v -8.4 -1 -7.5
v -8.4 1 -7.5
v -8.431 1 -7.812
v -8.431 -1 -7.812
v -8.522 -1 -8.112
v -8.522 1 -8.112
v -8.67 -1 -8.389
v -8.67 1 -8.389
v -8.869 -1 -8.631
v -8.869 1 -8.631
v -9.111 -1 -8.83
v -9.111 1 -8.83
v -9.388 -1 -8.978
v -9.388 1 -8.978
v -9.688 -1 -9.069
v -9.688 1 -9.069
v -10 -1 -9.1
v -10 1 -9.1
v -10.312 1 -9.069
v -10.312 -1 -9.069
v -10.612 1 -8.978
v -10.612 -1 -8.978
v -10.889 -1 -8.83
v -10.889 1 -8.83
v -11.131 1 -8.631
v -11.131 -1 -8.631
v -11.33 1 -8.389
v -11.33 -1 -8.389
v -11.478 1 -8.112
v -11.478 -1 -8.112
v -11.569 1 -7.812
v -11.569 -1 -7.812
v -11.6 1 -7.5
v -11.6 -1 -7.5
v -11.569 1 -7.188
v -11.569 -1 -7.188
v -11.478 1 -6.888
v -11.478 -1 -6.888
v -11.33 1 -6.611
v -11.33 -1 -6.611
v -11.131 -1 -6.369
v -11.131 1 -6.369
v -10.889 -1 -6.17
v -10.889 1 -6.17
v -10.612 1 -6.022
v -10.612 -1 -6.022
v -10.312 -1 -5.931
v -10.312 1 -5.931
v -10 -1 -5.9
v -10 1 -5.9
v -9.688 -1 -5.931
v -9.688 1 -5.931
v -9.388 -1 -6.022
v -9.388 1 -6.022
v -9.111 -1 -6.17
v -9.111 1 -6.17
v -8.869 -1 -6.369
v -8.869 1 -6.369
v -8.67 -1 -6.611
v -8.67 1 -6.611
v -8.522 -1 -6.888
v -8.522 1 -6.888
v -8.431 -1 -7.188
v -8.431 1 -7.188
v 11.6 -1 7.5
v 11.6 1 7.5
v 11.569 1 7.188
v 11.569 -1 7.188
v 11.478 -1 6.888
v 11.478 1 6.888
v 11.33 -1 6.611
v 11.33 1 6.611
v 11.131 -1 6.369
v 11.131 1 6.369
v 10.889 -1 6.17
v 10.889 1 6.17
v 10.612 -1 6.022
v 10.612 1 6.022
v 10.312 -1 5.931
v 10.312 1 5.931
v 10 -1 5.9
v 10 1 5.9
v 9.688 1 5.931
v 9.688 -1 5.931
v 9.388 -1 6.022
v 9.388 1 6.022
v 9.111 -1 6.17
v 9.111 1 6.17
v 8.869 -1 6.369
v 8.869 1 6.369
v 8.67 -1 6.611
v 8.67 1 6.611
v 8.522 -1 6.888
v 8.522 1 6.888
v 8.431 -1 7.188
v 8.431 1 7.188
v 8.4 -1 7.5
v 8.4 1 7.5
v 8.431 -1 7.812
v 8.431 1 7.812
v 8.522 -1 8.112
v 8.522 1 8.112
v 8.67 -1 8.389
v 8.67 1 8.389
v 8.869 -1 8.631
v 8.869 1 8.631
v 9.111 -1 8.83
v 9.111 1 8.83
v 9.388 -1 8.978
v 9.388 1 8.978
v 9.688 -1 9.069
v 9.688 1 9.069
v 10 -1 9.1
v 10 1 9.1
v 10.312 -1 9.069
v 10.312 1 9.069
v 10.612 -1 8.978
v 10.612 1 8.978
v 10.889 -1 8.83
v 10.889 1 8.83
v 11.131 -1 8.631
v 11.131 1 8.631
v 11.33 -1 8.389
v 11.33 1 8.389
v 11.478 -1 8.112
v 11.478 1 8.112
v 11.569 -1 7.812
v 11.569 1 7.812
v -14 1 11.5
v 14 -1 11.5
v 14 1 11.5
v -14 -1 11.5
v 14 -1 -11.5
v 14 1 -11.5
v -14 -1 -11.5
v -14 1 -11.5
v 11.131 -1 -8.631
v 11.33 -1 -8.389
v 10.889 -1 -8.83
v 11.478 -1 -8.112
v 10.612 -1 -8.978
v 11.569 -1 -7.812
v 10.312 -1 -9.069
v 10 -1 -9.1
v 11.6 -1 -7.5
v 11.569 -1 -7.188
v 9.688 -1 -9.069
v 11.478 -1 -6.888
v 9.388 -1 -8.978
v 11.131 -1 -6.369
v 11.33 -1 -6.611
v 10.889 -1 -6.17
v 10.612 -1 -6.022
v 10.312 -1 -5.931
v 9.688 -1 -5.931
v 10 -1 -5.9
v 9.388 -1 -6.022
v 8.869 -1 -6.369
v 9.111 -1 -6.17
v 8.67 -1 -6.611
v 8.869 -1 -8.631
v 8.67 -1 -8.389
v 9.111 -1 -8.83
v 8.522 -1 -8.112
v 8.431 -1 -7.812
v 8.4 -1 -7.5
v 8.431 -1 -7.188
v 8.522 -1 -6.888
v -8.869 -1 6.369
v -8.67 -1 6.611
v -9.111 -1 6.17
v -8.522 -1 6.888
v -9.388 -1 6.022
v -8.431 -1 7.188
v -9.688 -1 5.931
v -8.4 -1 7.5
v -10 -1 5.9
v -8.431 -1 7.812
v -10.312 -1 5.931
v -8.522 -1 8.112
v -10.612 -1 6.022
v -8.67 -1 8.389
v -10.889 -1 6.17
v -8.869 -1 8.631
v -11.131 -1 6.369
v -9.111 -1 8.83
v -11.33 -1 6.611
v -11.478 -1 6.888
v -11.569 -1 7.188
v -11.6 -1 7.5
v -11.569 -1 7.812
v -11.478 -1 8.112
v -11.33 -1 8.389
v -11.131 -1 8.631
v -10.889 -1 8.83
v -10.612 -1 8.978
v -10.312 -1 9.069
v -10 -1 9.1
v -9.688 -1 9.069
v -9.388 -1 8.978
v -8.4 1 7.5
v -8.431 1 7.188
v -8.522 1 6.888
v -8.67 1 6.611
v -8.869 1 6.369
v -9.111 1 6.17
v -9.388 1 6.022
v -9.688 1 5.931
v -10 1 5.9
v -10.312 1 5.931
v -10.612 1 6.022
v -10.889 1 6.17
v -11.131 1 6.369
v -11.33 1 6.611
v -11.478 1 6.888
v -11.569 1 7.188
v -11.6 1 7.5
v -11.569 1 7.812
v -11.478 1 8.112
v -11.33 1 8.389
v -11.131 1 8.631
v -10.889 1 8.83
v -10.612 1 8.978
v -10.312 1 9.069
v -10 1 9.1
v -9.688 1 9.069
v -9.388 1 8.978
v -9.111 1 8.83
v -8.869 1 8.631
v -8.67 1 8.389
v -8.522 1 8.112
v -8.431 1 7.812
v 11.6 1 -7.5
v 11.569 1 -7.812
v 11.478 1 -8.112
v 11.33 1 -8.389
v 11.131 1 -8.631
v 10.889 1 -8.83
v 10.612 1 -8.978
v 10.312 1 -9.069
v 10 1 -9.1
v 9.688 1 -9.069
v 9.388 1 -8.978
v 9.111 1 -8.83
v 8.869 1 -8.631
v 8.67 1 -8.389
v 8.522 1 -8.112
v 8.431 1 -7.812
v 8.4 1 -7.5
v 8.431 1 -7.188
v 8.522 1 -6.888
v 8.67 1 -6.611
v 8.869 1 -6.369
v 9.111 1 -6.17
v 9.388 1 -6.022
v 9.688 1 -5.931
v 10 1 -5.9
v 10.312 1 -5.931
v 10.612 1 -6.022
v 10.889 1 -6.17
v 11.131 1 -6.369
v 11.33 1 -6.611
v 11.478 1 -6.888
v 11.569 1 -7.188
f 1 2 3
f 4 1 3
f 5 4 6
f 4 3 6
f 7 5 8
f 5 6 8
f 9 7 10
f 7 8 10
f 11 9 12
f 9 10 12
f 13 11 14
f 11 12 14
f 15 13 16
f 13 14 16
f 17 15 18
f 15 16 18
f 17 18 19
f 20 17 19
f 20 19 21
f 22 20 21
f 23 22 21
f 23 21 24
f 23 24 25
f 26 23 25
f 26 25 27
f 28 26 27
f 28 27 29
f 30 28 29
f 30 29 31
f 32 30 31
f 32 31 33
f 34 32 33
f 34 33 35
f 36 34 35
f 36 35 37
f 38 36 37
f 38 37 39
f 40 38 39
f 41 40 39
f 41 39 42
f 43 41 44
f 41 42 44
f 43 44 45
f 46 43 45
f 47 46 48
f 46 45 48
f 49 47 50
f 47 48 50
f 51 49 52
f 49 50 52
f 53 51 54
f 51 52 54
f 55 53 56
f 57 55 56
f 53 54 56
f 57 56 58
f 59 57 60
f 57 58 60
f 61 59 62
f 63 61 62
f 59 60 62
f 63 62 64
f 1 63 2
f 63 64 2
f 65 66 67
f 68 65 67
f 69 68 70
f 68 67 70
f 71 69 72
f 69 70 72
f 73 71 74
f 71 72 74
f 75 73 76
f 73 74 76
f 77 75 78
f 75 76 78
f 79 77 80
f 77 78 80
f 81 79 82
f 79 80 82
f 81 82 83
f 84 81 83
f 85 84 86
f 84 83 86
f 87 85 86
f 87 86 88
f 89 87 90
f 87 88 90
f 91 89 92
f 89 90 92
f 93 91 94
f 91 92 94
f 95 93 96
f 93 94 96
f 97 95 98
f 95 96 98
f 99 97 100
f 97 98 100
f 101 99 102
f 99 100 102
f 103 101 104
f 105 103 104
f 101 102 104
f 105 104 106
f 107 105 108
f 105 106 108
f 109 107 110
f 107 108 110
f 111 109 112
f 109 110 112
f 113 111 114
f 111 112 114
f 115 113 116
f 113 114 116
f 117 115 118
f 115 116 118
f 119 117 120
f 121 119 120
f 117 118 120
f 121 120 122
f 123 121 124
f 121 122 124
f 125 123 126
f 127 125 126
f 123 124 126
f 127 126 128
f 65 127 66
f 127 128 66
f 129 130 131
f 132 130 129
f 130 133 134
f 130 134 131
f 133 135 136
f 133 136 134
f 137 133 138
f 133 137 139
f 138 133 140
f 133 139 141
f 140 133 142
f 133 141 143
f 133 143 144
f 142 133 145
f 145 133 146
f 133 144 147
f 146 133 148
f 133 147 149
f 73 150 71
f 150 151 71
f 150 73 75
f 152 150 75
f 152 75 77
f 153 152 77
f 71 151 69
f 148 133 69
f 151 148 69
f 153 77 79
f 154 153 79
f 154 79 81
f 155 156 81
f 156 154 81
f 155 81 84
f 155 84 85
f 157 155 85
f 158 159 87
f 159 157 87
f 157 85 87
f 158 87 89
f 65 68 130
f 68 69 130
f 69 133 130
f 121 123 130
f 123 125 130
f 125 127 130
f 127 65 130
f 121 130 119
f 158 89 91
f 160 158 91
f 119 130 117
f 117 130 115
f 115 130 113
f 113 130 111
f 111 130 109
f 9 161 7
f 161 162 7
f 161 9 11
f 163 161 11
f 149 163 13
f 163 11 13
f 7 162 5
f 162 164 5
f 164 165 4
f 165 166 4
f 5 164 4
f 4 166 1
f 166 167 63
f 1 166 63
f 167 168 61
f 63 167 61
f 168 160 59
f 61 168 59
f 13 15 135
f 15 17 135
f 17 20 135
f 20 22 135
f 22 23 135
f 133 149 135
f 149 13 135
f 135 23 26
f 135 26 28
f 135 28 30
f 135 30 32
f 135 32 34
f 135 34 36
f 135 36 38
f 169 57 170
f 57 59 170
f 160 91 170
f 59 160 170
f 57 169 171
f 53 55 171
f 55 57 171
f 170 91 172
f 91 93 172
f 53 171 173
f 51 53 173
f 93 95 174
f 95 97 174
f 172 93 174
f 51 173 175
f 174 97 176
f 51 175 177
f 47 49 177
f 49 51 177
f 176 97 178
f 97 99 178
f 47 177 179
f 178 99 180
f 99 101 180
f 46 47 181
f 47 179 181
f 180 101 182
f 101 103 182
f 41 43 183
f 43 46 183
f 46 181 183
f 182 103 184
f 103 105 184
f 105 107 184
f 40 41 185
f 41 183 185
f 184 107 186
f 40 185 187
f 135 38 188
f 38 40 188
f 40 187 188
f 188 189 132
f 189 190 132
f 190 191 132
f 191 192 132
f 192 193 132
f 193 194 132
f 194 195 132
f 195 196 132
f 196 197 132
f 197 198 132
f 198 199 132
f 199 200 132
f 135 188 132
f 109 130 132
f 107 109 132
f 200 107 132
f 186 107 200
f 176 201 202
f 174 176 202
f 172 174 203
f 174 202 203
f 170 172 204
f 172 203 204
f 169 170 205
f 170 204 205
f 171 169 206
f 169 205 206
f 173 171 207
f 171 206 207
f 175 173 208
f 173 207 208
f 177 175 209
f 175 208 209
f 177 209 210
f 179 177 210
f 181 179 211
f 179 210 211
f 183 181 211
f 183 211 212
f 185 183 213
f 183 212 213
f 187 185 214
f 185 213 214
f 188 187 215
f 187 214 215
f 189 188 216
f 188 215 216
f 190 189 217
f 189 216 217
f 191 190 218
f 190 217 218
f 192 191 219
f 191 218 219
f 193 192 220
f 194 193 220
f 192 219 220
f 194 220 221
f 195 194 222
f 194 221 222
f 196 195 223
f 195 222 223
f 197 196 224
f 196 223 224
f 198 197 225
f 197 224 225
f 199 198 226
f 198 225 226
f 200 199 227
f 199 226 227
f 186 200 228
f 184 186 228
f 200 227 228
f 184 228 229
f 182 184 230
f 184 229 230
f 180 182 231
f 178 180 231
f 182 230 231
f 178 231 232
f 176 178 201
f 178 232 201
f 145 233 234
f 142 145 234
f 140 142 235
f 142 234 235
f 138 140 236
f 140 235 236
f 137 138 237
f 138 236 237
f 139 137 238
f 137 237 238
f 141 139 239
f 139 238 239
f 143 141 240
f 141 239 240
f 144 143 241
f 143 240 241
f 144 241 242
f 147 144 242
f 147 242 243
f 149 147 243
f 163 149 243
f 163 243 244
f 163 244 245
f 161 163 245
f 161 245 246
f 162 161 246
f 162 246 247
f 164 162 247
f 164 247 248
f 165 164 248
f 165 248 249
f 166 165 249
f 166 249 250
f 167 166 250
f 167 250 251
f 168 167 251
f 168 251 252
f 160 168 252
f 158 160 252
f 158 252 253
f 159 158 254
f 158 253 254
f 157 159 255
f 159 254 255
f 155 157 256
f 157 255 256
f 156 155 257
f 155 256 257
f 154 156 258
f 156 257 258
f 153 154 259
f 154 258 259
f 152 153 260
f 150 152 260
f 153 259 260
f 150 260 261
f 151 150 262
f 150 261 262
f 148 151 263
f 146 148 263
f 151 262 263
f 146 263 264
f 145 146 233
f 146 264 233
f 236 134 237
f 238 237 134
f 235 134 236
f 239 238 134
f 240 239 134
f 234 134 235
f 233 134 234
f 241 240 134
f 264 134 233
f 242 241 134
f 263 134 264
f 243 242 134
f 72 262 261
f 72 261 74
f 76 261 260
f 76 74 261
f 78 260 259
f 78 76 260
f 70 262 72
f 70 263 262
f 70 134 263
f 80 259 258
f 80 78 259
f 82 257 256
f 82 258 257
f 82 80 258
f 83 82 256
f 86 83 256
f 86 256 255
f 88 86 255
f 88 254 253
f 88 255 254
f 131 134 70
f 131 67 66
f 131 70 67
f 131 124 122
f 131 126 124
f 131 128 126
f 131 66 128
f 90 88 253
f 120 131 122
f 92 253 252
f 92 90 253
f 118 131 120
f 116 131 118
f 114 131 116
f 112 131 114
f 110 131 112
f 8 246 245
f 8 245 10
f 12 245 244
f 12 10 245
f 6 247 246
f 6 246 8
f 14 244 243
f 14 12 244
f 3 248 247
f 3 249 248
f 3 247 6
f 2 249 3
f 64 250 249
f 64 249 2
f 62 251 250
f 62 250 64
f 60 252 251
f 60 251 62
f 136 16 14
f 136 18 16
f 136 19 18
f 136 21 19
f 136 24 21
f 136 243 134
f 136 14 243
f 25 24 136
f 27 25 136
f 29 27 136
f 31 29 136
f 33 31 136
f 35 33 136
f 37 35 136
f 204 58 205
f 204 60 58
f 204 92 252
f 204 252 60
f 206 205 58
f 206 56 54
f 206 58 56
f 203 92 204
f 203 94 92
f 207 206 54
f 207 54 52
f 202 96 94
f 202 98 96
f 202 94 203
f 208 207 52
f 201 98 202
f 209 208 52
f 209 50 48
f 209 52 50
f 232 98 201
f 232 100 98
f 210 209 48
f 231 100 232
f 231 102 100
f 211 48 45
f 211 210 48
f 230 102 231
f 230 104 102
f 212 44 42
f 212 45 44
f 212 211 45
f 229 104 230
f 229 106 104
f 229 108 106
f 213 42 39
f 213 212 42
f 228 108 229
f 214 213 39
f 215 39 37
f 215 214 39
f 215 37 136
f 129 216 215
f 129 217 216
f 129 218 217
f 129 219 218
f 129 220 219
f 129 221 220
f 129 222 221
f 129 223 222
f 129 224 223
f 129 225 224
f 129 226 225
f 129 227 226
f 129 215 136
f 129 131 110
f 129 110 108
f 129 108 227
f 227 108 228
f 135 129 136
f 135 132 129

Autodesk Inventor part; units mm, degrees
ref_plane "YZ Plane" through (0, 0, 0) normal (1, 0, 0) x (0, 1, 0)
ref_plane "XZ Plane" through (0, 0, 0) normal (0, 1, 0) x (-1, 0, 0)
ref_plane "XY Plane" through (0, 0, 0) normal (0, 0, 1) x (1, 0, 0)
sketch "Skizze1" plane through (0, 0, 0) normal (0, 1, 0) x (-1, 0, 0)
  line L0 (14, -11.5) -> (-14, -11.5)
  line L1 (-14, -11.5) -> (-14, 11.5)
  line L2 (-14, 11.5) -> (14, 11.5)
  line L3 (14, 11.5) -> (14, -11.5)
  line L4 (0, -16.1) -> (0, 16.1) projected
  line L5 (-19.6, 0) -> (19.6, 0) projected
  point P0 (0, 0)
  dimension "d0" = 28
  dimension "d1" = 23
extrude "Extrusion1" add sketch "Skizze1" along normal mid plane 2
sketch "Skizze2" plane through (0, 1, 0) normal (0, 1, 0) x (1, 0, 0)
  circle A0 centre (-10, 7.5) radius 1.6
  circle A1 centre (-10, -7.5) radius 1.6
  circle A2 centre (10, 7.5) radius 1.6
  circle A3 centre (10, -7.5) radius 1.6
  line L0 (0, 16.1) -> (0, -16.1) projected
  line L1 (19.6, 0) -> (-19.6, 0) projected
  point P0 (0, 0)
  dimension "d4" = 3.2
  dimension "d5" = 3.2
  dimension "d6" = 3.2
  dimension "d7" = 3.2
  dimension "d8" = 20
  dimension "d9" = 20
  dimension "d10" = 15
  dimension "d11" = 15
  dimension "d12" = 7.5
  dimension "d13" = 10
  dimension "d14" = 10
  dimension "d15" = 7.5
extrude "Extrusion2" cut sketch "Skizze2" against normal up to surface (2 mm away)
properties part number "Ebene3_verbindung"
